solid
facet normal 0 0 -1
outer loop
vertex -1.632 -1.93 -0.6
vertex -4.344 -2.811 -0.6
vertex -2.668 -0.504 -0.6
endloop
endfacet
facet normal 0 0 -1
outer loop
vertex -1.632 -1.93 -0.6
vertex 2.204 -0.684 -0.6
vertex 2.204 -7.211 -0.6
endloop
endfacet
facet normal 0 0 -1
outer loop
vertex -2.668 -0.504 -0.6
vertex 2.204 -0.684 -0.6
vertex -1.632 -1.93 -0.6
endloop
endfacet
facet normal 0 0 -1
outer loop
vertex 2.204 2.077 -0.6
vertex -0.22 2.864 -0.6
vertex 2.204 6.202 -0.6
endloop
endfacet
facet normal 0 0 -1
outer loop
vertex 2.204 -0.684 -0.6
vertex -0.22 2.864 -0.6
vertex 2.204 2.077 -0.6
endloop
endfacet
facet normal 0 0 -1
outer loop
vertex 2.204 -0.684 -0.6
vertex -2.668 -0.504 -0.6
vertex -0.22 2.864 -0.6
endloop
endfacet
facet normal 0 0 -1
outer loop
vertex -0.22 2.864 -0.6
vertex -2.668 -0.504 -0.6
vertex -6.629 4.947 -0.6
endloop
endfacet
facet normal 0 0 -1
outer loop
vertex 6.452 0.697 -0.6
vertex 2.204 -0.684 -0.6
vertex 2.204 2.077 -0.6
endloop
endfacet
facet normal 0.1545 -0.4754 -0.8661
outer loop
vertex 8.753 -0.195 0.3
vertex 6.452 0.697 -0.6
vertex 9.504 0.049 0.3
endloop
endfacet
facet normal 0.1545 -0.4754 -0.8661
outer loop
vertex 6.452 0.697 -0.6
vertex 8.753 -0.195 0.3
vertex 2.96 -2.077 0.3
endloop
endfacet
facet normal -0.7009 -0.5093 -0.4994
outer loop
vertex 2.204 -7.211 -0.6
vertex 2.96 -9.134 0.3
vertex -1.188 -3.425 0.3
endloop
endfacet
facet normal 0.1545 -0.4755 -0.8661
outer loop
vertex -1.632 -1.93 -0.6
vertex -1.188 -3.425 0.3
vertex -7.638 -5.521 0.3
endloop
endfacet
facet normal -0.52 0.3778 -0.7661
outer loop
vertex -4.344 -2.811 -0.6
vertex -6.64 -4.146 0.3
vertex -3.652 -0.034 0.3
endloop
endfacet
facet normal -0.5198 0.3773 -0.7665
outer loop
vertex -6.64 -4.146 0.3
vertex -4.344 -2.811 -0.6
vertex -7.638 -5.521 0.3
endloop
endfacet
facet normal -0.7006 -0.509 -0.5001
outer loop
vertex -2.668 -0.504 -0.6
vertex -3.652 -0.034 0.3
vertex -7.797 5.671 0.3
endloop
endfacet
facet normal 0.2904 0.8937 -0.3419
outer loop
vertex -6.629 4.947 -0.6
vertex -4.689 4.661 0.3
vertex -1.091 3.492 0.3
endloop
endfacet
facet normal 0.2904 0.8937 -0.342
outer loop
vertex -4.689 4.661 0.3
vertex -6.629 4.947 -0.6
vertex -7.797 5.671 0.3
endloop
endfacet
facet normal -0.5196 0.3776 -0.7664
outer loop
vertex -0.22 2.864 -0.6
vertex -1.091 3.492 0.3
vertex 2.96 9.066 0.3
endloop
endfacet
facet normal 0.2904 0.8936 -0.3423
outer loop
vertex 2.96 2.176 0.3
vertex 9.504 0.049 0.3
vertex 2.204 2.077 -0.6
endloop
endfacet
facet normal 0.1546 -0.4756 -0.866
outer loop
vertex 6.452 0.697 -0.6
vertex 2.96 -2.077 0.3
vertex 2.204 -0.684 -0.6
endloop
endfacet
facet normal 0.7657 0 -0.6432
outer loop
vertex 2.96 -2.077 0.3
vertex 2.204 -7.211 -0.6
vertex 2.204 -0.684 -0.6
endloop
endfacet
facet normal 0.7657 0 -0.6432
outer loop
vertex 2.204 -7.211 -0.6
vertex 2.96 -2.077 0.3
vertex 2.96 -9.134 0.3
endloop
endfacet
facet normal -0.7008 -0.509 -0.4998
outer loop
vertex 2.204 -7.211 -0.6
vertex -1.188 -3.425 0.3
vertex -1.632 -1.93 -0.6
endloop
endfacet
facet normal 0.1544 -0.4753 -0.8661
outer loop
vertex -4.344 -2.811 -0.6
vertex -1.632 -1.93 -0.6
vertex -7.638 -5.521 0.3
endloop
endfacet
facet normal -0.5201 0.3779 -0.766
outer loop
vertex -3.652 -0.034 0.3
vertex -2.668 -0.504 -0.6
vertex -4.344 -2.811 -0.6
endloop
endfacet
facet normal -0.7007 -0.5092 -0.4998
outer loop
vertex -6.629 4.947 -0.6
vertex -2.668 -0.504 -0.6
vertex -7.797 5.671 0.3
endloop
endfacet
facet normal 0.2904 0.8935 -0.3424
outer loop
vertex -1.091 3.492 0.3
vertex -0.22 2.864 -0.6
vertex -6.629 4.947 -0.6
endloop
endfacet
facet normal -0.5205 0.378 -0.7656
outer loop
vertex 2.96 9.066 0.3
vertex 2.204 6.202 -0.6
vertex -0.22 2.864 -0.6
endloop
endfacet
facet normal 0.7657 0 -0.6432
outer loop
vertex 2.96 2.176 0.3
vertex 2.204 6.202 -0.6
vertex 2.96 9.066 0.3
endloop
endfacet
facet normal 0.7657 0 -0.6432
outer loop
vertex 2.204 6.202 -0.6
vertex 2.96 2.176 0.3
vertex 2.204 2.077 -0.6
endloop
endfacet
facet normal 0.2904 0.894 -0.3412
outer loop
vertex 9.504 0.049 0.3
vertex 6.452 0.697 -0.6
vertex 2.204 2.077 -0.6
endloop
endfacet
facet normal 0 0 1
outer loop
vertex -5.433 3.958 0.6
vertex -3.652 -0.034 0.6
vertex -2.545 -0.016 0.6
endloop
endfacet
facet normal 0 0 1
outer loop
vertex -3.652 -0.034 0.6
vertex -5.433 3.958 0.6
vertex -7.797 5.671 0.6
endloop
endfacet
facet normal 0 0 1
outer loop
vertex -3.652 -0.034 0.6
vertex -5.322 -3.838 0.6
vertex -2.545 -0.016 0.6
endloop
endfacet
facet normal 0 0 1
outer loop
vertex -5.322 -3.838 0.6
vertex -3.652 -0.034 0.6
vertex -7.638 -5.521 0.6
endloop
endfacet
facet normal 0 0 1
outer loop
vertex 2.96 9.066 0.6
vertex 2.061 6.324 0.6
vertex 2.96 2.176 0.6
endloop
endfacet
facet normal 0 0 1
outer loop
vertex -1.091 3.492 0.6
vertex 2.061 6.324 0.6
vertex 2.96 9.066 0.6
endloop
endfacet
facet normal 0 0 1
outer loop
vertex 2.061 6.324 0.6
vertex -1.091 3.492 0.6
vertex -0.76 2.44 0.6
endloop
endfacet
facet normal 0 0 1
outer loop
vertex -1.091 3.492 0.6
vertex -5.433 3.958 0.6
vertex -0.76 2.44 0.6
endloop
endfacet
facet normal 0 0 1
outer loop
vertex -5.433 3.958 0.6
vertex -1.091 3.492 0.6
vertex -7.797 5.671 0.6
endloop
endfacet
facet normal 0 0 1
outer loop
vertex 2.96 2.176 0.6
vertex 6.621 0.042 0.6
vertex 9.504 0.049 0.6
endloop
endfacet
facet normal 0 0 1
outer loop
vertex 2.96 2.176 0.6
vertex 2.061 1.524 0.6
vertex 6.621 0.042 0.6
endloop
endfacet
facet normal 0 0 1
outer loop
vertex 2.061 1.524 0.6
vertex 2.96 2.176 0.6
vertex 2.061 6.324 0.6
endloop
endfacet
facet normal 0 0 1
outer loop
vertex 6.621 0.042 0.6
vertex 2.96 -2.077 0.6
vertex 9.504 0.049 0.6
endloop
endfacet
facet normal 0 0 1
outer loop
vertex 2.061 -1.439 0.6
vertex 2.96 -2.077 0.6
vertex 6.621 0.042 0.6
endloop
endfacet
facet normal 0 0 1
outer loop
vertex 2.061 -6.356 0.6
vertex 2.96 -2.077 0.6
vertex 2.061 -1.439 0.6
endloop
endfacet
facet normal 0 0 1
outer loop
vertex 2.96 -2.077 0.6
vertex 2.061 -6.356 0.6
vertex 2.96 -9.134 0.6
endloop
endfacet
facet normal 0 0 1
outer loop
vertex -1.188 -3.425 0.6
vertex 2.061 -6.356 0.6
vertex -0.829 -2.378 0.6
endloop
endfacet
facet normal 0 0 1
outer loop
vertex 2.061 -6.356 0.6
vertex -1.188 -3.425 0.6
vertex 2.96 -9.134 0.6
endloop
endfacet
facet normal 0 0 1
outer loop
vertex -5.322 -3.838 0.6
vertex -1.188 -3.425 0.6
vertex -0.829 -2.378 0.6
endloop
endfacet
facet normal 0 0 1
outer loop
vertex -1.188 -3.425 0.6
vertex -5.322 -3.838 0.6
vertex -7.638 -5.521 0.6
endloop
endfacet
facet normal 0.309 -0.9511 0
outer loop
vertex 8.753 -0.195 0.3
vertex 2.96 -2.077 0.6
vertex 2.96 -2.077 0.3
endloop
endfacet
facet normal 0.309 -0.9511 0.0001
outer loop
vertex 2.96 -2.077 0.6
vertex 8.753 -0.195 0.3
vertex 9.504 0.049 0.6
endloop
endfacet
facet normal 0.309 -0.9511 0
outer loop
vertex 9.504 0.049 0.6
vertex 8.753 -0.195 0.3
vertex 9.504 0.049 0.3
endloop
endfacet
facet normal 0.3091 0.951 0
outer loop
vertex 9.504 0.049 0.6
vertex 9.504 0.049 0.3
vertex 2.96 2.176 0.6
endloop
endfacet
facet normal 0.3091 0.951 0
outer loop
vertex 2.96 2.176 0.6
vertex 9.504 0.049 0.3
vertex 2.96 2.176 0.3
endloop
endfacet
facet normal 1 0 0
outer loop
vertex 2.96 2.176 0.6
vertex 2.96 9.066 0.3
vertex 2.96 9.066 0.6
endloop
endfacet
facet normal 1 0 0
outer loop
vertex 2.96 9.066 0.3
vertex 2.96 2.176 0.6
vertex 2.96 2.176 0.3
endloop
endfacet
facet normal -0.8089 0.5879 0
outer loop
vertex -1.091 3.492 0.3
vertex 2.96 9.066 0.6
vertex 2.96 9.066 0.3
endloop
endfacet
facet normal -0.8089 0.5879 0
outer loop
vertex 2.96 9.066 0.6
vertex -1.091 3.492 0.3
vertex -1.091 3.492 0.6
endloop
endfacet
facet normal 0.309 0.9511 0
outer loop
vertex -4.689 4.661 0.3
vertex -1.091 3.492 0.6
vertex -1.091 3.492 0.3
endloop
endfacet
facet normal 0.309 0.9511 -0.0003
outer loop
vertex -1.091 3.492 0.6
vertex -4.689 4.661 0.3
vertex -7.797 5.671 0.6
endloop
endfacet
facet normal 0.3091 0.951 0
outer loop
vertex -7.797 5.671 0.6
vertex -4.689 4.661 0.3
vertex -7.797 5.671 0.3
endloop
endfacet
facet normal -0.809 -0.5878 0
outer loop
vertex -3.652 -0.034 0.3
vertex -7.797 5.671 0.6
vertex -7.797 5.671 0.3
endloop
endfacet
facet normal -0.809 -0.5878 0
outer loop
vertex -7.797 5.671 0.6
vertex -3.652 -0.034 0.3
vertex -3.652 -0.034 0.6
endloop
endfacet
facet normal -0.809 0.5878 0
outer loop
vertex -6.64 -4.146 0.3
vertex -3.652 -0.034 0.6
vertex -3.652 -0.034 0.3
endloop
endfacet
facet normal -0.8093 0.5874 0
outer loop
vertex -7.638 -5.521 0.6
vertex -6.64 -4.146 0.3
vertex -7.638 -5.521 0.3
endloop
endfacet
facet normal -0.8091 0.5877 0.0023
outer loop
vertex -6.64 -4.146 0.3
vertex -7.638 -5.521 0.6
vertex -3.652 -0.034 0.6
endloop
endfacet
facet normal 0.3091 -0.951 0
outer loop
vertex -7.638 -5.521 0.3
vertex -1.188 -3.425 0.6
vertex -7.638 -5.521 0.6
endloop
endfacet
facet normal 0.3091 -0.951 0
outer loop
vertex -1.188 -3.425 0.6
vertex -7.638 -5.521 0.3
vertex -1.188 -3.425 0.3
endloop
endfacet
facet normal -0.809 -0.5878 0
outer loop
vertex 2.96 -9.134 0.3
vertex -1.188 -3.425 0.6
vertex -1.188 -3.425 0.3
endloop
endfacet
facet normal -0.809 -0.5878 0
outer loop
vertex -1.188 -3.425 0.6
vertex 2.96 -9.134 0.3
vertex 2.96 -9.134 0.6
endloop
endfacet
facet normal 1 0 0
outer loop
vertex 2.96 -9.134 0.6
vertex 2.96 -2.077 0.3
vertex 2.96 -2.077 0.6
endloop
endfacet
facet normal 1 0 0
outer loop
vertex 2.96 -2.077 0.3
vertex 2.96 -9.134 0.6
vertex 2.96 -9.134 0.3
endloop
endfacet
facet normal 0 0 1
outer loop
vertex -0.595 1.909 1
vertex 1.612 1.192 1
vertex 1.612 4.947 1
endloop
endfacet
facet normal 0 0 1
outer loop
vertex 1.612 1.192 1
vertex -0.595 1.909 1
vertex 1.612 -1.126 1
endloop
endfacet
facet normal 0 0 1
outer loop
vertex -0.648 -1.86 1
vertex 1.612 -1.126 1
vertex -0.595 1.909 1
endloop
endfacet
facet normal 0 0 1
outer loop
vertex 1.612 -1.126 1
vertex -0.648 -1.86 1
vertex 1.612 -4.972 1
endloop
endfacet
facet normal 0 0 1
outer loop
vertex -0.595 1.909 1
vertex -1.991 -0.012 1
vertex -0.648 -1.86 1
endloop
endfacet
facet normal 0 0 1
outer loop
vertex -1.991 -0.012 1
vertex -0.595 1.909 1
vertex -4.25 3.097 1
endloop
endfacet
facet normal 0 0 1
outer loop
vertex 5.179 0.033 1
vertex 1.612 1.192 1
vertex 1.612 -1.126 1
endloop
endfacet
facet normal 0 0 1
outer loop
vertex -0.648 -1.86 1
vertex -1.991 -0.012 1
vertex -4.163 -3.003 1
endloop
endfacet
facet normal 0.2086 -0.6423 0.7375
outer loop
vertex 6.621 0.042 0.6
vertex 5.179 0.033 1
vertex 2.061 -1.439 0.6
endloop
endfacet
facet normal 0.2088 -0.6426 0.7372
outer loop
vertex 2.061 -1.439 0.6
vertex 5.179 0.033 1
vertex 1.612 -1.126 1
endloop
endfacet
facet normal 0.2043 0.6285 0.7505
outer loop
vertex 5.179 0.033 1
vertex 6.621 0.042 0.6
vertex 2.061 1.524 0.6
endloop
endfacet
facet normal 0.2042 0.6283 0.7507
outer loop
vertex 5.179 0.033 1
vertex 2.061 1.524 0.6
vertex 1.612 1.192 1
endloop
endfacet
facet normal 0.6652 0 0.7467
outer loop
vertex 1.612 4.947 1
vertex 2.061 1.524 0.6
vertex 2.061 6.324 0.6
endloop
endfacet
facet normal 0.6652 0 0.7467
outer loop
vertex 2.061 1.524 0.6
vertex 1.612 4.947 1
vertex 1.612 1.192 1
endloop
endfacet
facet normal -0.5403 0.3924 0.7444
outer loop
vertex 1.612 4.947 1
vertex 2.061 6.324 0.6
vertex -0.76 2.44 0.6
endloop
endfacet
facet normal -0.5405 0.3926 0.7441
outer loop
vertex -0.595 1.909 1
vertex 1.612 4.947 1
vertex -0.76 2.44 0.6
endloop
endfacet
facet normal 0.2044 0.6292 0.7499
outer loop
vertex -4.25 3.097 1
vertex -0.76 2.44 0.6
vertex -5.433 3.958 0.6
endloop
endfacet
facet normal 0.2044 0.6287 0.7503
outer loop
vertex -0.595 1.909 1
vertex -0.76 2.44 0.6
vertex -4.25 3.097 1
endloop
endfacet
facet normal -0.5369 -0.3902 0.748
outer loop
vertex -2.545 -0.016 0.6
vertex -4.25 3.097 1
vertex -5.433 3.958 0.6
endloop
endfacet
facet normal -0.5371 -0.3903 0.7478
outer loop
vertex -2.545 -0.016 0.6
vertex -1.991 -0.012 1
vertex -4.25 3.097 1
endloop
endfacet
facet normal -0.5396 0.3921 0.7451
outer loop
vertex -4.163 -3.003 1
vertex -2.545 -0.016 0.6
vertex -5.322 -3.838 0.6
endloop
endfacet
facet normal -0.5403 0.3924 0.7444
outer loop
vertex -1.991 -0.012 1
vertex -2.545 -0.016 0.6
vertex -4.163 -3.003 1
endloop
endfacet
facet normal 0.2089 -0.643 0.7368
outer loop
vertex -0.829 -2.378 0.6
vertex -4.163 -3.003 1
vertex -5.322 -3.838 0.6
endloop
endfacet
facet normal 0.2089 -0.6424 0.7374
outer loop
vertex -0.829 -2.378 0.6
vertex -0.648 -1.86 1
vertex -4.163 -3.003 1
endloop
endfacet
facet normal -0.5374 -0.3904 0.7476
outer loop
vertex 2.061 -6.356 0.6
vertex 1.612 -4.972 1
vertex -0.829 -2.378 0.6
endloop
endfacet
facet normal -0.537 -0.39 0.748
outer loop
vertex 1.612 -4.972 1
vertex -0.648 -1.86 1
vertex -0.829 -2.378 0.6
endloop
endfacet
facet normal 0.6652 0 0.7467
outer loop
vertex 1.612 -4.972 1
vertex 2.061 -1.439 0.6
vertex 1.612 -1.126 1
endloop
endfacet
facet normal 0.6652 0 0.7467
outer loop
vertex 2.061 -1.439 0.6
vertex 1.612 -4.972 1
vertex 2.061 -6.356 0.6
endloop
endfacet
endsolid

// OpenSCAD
use <../../core/funcs.scad>
use <../../core/render.scad>
use <../../core/segments.scad>
use <../../core/validate.scad>

// Base in-plane inset applied to each face edge (mm).
FACE_PLATE_EDGE_INSET = 0.2;
// Minimum face radius before adding the pillow (mm).
FACE_PLATE_PILLOW_MIN_RAD = 5;
// Pillow inset at the face surface (mm).
FACE_PLATE_PILLOW_INSET = 2;
// Additional pillow inset at the raised height (mm).
FACE_PLATE_PILLOW_RAMP = 1;
// Pillow thickness above the face (mm).
FACE_PLATE_PILLOW_THK = 0.4;

// Thickness of the top polygon above the ramped edges.
FACE_PLATE_TOP_THK = 0.3;
// Clearance height for face sockets (mm) - make larger if face is far inset into a face.
FACE_PLATE_CLEAR_HEIGHT = 10;

function _line_intersect_2d(n1, d1, n2, d2) =
    let(det = n1[0] * n2[1] - n1[1] * n2[0])
    (abs(det) < 1e-9)
        ? [0, 0]
        : [
            (d1 * n2[1] - n1[1] * d2) / det,
            (n1[0] * d2 - d1 * n2[0]) / det
        ];


function ps_rot_axis(v, axis, ang) =
    let(
        a = v_norm(axis),
        c = cos(ang),
        s = sin(ang),
        term1 = v_scale(v, c),
        term2 = v_scale(v_cross(a, v), s),
        term3 = v_scale(a, v_dot(a, v) * (1 - c))
    )
    v_add(v_add(term1, term2), term3);


function _offset_pts2d(pts, diheds, ht) =
    let(
        n = len(pts),
        centroid = v_scale([
            sum([for (p = pts) p[0]]),
            sum([for (p = pts) p[1]])
        ], 1 / n),
        lines = [
            for (k = [0:1:n-1])
                let(
                    p0 = pts[k],
                    p1 = pts[(k+1)%n],
                    e = v_norm(p1 - p0),
                    perp0 = v_norm([ -e[1], e[0] ]),
                    mid = (p0 + p1) / 2,
                    to_center = centroid - mid,
                    perp = (v_dot(perp0, to_center) < 0) ? -perp0 : perp0,
                    inset = -(ht/2) * tan((180 - diheds[k]) / 2),
                    d = v_dot(perp, p0) - inset
                )
                [perp, d]
        ]
    )
    [
        for (k = [0:1:n-1])
            let(
                l0 = lines[(k-1+n)%n],
                l1 = lines[k]
            )
            _line_intersect_2d(l0[0], l0[1], l1[0], l1[1])
    ];


function _offset_pts2d_inset(pts, inset) =
    let(
        n = len(pts),
        centroid = v_scale([
            sum([for (p = pts) p[0]]),
            sum([for (p = pts) p[1]])
        ], 1 / n),
        lines = [
            for (k = [0:1:n-1])
                let(
                    p0 = pts[k],
                    p1 = pts[(k+1)%n],
                    e = v_norm(p1 - p0),
                    perp0 = v_norm([ -e[1], e[0] ]),
                    mid = (p0 + p1) / 2,
                    to_center = centroid - mid,
                    perp = (v_dot(perp0, to_center) < 0) ? -perp0 : perp0,
                    d = v_dot(perp, p0) + inset
                )
                [perp, d]
        ]
    )
    [
        for (k = [0:1:n-1])
            let(
                l0 = lines[(k-1+n)%n],
                l1 = lines[k]
            )
            _line_intersect_2d(l0[0], l0[1], l1[0], l1[1])
    ];

function _offset_pts2d_inset_edges(pts, insets) =
    let(
        n = len(pts),
        centroid = v_scale([
            sum([for (p = pts) p[0]]),
            sum([for (p = pts) p[1]])
        ], 1 / n),
        lines = [
            for (k = [0:1:n-1])
                let(
                    p0 = pts[k],
                    p1 = pts[(k+1)%n],
                    e = v_norm(p1 - p0),
                    perp0 = v_norm([ -e[1], e[0] ]),
                    mid = (p0 + p1) / 2,
                    to_center = centroid - mid,
                    perp = (v_dot(perp0, to_center) < 0) ? -perp0 : perp0,
                    d = v_dot(perp, p0) + insets[k]
                )
                [perp, d]
        ]
    )
    [
        for (k = [0:1:n-1])
            let(
                l0 = lines[(k-1+n)%n],
                l1 = lines[k]
            )
            _line_intersect_2d(l0[0], l0[1], l1[0], l1[1])
    ];
    
function _gap_inset(dihed, gap) =
    let(s = sin(dihed / 2))
    (abs(s) < 1e-6) ? gap : (gap / (2 * s));


function _bottom_pts2d_from_bevel(top_pts, diheds, ht) =
    let(
        n = len(top_pts),
        centroid = v_scale([
            sum([for (p = top_pts) p[0]]),
            sum([for (p = top_pts) p[1]])
        ], 1 / n),
        lines = [
            for (k = [0:1:n-1])
                let(
                    p0 = top_pts[k],
                    p1 = top_pts[(k+1)%n],
                    e = v_norm([p1[0]-p0[0], p1[1]-p0[1], 0]),
                    n0 = [0,0,1],
                    // LHR: rotate outward normal toward adjacent face by +dihedral.
                    n1 = ps_rot_axis(n0, e, diheds[k]),
                    n_side = v_norm(n0 + n1),
                    n_xy = [n_side[0], n_side[1]],
                    d2_raw = v_dot(n_xy, p0) + n_side[2] * ht,
                    flip = (v_dot(n_xy, centroid) > d2_raw),
                    n_xy2 = flip ? [-n_xy[0], -n_xy[1]] : n_xy,
                    d2 = flip ? -d2_raw : d2_raw
                )
                [n_xy2, d2]
        ]
    )
    [
        for (k = [0:1:n-1])
            let(
                l0 = lines[(k-1+n)%n],
                l1 = lines[k]
            )
            _line_intersect_2d(l0[0], l0[1], l1[0], l1[1])
    ];




function _bottom_pts2d_from_planes(pts, diheds, ht) =
    let(
        n = len(pts),
        centroid = v_scale([
            sum([for (p = pts) p[0]]),
            sum([for (p = pts) p[1]])
        ], 1 / n),
        lines = [
            for (k = [0:1:n-1])
                let(
                    p0 = pts[k],
                    p1 = pts[(k+1)%n],
                    e = v_norm(p1 - p0),
                    perp0 = v_norm([ e[1], -e[0] ]),
                    mid = (p0 + p1) / 2,
                    to_center = centroid - mid,
                    perp = (v_dot(perp0, to_center) < 0) ? -perp0 : perp0,
                    alpha = (180 - diheds[k]) / 2,
                    n_xy = v_scale(perp, sin(alpha)),
                    n_z = cos(alpha),
                    d2 = v_dot(n_xy, p0) + n_z * ht
                )
                [n_xy, d2]
        ]
    )
    [
        for (k = [0:1:n-1])
            let(
                l0 = lines[(k-1+n)%n],
                l1 = lines[k]
            )
            _line_intersect_2d(l0[0], l0[1], l1[0], l1[1])
    ];


function _pts_centroid2d(pts) =
    let(n = len(pts))
    [sum([for (p = pts) p[0]]) / n, sum([for (p = pts) p[1]]) / n];

function _pts_radius2d(pts, centroid) =
    let(n = len(pts))
    sum([for (p = pts) norm([p[0] - centroid[0], p[1] - centroid[1]])]) / n;

function _safe_at(v, i, dflt) =
    (is_undef(i) || i < 0 || i >= len(v)) ? dflt : v[i];

function _segmented_inset_loops2d(pts, insets, eps=1e-8) =
    let(
        segs = ps_face_segments([for (p = pts) [p[0], p[1], 0]], "nonzero", eps)
    )
    [
        for (s = segs)
            let(
                s_pts = s[0],
                s_edge_ids = s[2],
                m = len(s_pts),
                s_insets = [
                    for (k = [0:1:m-1])
                        let(seg = [s_pts[k], s_pts[(k+1)%m]])
                        _ps_seg_is_parent_edge(seg, pts, eps)
                            ? _safe_at(insets, _safe_at(s_edge_ids, k, 0), 0)
                            : 0
                ]
            )
            _offset_pts2d_inset_edges(s_pts, s_insets)
    ];

function _segmented_body_loops(pts, diheds, insets, eps=1e-8) =
    let(
        segs = ps_face_segments([for (p = pts) [p[0], p[1], 0]], "nonzero", eps)
    )
    [
        for (s = segs)
            let(
                s_pts = s[0],
                s_edge_ids = s[2],
                m = len(s_pts),
                s_insets = [
                    for (k = [0:1:m-1])
                        let(seg = [s_pts[k], s_pts[(k+1)%m]])
                        _ps_seg_is_parent_edge(seg, pts, eps)
                            ? _safe_at(insets, _safe_at(s_edge_ids, k, 0), 0)
                            : 0
                ],
                s_diheds = [
                    for (k = [0:1:m-1])
                        let(seg = [s_pts[k], s_pts[(k+1)%m]])
                        _ps_seg_is_parent_edge(seg, pts, eps)
                            ? _safe_at(diheds, _safe_at(s_edge_ids, k, 0), 180)
                            : 180
                ],
                s_top2d = _offset_pts2d_inset_edges(s_pts, s_insets)
            )
            [s_top2d, s_diheds]
    ];


// Bevel by constructing an inset bottom polygon and lofting.
// Expects LHR/CW polygon order for pts and aligned dihedrals.
module face_plate(idx, pts, face_thk, diheds, insets_override, clear_space,
    edge_inset = FACE_PLATE_EDGE_INSET,
    pillow_min_rad = FACE_PLATE_PILLOW_MIN_RAD,
    pillow_inset = FACE_PLATE_PILLOW_INSET,
    pillow_ramp = FACE_PLATE_PILLOW_RAMP,
    pillow_thk = FACE_PLATE_PILLOW_THK,
    top_thk = FACE_PLATE_TOP_THK,
    base_z = undef,
    clear_height = FACE_PLATE_CLEAR_HEIGHT,
    eps = 1e-4
) {
    n = len(pts);
    insets = (is_undef(insets_override) || len(insets_override) != n)
        ? [for (k = [0:1:len(pts)-1]) _gap_inset(diheds[k], edge_inset)]
        : insets_override;
    body_loops = (edge_inset > 0)
        ? _segmented_body_loops(pts, diheds, insets, eps)
        : [[pts, diheds]];
    roof_loops = [for (bd = body_loops) bd[0]];
    pts_gap = roof_loops[0];
    centroid = _pts_centroid2d(pts_gap);
    rad = _pts_radius2d(pts_gap, centroid);

    base_z_eff = is_undef(base_z)? -face_thk / 2 : base_z; // base Z coord
    ramped_thk = face_thk - top_thk; // actual thickness of ramped part
    color(len(pts) == 3 ? "white" : "red") {
        // ramped part
        for (bd = body_loops) {
            loop2d = bd[0];
            loop_diheds = bd[1];
            m = len(loop2d);
            top = [for (p = loop2d) [p[0], p[1], base_z_eff + ramped_thk]];
            bottom2d = _bottom_pts2d_from_bevel(loop2d, loop_diheds, ramped_thk);
            bottom = [for (p = bottom2d) [p[0], p[1], base_z_eff]];
            points = concat(top, bottom);
            faces = concat(
                [[for (i = [0:1:m-1]) i]],
                [[for (i = [0:1:m-1]) (2*m-1-i)]],
                [for (i = [0:1:m-1]) [(i+1)%m, i, m + i]],
                [for (i = [0:1:m-1]) [(i+1)%m, m + i, m + (i+1)%m]]
            );
            polyhedron(points = points, faces = faces, convexity = 2);
        }

        // flat roof part: segment self-intersecting loops before insetting.
        translate([0, 0, base_z_eff + ramped_thk]) linear_extrude(top_thk)
            union() {
                for (loop = roof_loops)
                    ps_polygon(points = loop, mode = "nonzero");
            }

        // top pillow part
        if (rad > pillow_min_rad) {
            // Build the pillow from the same simple loops as the face body/roof.
            for (loop = roof_loops) {
                loop_centroid = _pts_centroid2d(loop);
                loop_rad = _pts_radius2d(loop, loop_centroid);
                if (loop_rad > pillow_inset + pillow_ramp + eps) {
                    s0 = max(0, 1 - pillow_inset / loop_rad);
                    s1 = max(0, 1 - (pillow_inset + pillow_ramp) / loop_rad);
                    p0 = [for (p = loop) [
                        loop_centroid[0] + (p[0] - loop_centroid[0]) * s0,
                        loop_centroid[1] + (p[1] - loop_centroid[1]) * s0
                    ]];
                    scale_xy = s0 <= eps ? 0 : (s1 / s0);
                    translate([0, 0, base_z_eff + face_thk])
                        linear_extrude(height = pillow_thk, scale = scale_xy)
                            ps_polygon(points = p0, mode = "nonzero");
                }
            }
        }
    }

    // Conditionally clears the airspace above the face, to remove material from the face-mount above the face
    if (clear_space) {
        color("magenta") translate([0, 0, base_z_eff + face_thk - eps]) linear_extrude(height = clear_height)
            union() {
                for (loop = roof_loops)
                    ps_polygon(points = loop, mode = "nonzero");
            }
    }
}



// Please keep this:
//difference() {
//    translate([0,0,-5]) cube(20);
//
//    !face_plate(0, [[10,0],[0,-10],[-10,0],[0,10]], face_thk=1.2, diheds=[140,80,140,80], insets_override=undef, clear_space=false);
    !face_plate(0, [for (i=[0:4]) [10*cos(-144*i), 10*sin(-144*i)]], face_thk=1.2, diheds=[60,80,100,120,140], insets_override=undef, clear_space=false);
//}
